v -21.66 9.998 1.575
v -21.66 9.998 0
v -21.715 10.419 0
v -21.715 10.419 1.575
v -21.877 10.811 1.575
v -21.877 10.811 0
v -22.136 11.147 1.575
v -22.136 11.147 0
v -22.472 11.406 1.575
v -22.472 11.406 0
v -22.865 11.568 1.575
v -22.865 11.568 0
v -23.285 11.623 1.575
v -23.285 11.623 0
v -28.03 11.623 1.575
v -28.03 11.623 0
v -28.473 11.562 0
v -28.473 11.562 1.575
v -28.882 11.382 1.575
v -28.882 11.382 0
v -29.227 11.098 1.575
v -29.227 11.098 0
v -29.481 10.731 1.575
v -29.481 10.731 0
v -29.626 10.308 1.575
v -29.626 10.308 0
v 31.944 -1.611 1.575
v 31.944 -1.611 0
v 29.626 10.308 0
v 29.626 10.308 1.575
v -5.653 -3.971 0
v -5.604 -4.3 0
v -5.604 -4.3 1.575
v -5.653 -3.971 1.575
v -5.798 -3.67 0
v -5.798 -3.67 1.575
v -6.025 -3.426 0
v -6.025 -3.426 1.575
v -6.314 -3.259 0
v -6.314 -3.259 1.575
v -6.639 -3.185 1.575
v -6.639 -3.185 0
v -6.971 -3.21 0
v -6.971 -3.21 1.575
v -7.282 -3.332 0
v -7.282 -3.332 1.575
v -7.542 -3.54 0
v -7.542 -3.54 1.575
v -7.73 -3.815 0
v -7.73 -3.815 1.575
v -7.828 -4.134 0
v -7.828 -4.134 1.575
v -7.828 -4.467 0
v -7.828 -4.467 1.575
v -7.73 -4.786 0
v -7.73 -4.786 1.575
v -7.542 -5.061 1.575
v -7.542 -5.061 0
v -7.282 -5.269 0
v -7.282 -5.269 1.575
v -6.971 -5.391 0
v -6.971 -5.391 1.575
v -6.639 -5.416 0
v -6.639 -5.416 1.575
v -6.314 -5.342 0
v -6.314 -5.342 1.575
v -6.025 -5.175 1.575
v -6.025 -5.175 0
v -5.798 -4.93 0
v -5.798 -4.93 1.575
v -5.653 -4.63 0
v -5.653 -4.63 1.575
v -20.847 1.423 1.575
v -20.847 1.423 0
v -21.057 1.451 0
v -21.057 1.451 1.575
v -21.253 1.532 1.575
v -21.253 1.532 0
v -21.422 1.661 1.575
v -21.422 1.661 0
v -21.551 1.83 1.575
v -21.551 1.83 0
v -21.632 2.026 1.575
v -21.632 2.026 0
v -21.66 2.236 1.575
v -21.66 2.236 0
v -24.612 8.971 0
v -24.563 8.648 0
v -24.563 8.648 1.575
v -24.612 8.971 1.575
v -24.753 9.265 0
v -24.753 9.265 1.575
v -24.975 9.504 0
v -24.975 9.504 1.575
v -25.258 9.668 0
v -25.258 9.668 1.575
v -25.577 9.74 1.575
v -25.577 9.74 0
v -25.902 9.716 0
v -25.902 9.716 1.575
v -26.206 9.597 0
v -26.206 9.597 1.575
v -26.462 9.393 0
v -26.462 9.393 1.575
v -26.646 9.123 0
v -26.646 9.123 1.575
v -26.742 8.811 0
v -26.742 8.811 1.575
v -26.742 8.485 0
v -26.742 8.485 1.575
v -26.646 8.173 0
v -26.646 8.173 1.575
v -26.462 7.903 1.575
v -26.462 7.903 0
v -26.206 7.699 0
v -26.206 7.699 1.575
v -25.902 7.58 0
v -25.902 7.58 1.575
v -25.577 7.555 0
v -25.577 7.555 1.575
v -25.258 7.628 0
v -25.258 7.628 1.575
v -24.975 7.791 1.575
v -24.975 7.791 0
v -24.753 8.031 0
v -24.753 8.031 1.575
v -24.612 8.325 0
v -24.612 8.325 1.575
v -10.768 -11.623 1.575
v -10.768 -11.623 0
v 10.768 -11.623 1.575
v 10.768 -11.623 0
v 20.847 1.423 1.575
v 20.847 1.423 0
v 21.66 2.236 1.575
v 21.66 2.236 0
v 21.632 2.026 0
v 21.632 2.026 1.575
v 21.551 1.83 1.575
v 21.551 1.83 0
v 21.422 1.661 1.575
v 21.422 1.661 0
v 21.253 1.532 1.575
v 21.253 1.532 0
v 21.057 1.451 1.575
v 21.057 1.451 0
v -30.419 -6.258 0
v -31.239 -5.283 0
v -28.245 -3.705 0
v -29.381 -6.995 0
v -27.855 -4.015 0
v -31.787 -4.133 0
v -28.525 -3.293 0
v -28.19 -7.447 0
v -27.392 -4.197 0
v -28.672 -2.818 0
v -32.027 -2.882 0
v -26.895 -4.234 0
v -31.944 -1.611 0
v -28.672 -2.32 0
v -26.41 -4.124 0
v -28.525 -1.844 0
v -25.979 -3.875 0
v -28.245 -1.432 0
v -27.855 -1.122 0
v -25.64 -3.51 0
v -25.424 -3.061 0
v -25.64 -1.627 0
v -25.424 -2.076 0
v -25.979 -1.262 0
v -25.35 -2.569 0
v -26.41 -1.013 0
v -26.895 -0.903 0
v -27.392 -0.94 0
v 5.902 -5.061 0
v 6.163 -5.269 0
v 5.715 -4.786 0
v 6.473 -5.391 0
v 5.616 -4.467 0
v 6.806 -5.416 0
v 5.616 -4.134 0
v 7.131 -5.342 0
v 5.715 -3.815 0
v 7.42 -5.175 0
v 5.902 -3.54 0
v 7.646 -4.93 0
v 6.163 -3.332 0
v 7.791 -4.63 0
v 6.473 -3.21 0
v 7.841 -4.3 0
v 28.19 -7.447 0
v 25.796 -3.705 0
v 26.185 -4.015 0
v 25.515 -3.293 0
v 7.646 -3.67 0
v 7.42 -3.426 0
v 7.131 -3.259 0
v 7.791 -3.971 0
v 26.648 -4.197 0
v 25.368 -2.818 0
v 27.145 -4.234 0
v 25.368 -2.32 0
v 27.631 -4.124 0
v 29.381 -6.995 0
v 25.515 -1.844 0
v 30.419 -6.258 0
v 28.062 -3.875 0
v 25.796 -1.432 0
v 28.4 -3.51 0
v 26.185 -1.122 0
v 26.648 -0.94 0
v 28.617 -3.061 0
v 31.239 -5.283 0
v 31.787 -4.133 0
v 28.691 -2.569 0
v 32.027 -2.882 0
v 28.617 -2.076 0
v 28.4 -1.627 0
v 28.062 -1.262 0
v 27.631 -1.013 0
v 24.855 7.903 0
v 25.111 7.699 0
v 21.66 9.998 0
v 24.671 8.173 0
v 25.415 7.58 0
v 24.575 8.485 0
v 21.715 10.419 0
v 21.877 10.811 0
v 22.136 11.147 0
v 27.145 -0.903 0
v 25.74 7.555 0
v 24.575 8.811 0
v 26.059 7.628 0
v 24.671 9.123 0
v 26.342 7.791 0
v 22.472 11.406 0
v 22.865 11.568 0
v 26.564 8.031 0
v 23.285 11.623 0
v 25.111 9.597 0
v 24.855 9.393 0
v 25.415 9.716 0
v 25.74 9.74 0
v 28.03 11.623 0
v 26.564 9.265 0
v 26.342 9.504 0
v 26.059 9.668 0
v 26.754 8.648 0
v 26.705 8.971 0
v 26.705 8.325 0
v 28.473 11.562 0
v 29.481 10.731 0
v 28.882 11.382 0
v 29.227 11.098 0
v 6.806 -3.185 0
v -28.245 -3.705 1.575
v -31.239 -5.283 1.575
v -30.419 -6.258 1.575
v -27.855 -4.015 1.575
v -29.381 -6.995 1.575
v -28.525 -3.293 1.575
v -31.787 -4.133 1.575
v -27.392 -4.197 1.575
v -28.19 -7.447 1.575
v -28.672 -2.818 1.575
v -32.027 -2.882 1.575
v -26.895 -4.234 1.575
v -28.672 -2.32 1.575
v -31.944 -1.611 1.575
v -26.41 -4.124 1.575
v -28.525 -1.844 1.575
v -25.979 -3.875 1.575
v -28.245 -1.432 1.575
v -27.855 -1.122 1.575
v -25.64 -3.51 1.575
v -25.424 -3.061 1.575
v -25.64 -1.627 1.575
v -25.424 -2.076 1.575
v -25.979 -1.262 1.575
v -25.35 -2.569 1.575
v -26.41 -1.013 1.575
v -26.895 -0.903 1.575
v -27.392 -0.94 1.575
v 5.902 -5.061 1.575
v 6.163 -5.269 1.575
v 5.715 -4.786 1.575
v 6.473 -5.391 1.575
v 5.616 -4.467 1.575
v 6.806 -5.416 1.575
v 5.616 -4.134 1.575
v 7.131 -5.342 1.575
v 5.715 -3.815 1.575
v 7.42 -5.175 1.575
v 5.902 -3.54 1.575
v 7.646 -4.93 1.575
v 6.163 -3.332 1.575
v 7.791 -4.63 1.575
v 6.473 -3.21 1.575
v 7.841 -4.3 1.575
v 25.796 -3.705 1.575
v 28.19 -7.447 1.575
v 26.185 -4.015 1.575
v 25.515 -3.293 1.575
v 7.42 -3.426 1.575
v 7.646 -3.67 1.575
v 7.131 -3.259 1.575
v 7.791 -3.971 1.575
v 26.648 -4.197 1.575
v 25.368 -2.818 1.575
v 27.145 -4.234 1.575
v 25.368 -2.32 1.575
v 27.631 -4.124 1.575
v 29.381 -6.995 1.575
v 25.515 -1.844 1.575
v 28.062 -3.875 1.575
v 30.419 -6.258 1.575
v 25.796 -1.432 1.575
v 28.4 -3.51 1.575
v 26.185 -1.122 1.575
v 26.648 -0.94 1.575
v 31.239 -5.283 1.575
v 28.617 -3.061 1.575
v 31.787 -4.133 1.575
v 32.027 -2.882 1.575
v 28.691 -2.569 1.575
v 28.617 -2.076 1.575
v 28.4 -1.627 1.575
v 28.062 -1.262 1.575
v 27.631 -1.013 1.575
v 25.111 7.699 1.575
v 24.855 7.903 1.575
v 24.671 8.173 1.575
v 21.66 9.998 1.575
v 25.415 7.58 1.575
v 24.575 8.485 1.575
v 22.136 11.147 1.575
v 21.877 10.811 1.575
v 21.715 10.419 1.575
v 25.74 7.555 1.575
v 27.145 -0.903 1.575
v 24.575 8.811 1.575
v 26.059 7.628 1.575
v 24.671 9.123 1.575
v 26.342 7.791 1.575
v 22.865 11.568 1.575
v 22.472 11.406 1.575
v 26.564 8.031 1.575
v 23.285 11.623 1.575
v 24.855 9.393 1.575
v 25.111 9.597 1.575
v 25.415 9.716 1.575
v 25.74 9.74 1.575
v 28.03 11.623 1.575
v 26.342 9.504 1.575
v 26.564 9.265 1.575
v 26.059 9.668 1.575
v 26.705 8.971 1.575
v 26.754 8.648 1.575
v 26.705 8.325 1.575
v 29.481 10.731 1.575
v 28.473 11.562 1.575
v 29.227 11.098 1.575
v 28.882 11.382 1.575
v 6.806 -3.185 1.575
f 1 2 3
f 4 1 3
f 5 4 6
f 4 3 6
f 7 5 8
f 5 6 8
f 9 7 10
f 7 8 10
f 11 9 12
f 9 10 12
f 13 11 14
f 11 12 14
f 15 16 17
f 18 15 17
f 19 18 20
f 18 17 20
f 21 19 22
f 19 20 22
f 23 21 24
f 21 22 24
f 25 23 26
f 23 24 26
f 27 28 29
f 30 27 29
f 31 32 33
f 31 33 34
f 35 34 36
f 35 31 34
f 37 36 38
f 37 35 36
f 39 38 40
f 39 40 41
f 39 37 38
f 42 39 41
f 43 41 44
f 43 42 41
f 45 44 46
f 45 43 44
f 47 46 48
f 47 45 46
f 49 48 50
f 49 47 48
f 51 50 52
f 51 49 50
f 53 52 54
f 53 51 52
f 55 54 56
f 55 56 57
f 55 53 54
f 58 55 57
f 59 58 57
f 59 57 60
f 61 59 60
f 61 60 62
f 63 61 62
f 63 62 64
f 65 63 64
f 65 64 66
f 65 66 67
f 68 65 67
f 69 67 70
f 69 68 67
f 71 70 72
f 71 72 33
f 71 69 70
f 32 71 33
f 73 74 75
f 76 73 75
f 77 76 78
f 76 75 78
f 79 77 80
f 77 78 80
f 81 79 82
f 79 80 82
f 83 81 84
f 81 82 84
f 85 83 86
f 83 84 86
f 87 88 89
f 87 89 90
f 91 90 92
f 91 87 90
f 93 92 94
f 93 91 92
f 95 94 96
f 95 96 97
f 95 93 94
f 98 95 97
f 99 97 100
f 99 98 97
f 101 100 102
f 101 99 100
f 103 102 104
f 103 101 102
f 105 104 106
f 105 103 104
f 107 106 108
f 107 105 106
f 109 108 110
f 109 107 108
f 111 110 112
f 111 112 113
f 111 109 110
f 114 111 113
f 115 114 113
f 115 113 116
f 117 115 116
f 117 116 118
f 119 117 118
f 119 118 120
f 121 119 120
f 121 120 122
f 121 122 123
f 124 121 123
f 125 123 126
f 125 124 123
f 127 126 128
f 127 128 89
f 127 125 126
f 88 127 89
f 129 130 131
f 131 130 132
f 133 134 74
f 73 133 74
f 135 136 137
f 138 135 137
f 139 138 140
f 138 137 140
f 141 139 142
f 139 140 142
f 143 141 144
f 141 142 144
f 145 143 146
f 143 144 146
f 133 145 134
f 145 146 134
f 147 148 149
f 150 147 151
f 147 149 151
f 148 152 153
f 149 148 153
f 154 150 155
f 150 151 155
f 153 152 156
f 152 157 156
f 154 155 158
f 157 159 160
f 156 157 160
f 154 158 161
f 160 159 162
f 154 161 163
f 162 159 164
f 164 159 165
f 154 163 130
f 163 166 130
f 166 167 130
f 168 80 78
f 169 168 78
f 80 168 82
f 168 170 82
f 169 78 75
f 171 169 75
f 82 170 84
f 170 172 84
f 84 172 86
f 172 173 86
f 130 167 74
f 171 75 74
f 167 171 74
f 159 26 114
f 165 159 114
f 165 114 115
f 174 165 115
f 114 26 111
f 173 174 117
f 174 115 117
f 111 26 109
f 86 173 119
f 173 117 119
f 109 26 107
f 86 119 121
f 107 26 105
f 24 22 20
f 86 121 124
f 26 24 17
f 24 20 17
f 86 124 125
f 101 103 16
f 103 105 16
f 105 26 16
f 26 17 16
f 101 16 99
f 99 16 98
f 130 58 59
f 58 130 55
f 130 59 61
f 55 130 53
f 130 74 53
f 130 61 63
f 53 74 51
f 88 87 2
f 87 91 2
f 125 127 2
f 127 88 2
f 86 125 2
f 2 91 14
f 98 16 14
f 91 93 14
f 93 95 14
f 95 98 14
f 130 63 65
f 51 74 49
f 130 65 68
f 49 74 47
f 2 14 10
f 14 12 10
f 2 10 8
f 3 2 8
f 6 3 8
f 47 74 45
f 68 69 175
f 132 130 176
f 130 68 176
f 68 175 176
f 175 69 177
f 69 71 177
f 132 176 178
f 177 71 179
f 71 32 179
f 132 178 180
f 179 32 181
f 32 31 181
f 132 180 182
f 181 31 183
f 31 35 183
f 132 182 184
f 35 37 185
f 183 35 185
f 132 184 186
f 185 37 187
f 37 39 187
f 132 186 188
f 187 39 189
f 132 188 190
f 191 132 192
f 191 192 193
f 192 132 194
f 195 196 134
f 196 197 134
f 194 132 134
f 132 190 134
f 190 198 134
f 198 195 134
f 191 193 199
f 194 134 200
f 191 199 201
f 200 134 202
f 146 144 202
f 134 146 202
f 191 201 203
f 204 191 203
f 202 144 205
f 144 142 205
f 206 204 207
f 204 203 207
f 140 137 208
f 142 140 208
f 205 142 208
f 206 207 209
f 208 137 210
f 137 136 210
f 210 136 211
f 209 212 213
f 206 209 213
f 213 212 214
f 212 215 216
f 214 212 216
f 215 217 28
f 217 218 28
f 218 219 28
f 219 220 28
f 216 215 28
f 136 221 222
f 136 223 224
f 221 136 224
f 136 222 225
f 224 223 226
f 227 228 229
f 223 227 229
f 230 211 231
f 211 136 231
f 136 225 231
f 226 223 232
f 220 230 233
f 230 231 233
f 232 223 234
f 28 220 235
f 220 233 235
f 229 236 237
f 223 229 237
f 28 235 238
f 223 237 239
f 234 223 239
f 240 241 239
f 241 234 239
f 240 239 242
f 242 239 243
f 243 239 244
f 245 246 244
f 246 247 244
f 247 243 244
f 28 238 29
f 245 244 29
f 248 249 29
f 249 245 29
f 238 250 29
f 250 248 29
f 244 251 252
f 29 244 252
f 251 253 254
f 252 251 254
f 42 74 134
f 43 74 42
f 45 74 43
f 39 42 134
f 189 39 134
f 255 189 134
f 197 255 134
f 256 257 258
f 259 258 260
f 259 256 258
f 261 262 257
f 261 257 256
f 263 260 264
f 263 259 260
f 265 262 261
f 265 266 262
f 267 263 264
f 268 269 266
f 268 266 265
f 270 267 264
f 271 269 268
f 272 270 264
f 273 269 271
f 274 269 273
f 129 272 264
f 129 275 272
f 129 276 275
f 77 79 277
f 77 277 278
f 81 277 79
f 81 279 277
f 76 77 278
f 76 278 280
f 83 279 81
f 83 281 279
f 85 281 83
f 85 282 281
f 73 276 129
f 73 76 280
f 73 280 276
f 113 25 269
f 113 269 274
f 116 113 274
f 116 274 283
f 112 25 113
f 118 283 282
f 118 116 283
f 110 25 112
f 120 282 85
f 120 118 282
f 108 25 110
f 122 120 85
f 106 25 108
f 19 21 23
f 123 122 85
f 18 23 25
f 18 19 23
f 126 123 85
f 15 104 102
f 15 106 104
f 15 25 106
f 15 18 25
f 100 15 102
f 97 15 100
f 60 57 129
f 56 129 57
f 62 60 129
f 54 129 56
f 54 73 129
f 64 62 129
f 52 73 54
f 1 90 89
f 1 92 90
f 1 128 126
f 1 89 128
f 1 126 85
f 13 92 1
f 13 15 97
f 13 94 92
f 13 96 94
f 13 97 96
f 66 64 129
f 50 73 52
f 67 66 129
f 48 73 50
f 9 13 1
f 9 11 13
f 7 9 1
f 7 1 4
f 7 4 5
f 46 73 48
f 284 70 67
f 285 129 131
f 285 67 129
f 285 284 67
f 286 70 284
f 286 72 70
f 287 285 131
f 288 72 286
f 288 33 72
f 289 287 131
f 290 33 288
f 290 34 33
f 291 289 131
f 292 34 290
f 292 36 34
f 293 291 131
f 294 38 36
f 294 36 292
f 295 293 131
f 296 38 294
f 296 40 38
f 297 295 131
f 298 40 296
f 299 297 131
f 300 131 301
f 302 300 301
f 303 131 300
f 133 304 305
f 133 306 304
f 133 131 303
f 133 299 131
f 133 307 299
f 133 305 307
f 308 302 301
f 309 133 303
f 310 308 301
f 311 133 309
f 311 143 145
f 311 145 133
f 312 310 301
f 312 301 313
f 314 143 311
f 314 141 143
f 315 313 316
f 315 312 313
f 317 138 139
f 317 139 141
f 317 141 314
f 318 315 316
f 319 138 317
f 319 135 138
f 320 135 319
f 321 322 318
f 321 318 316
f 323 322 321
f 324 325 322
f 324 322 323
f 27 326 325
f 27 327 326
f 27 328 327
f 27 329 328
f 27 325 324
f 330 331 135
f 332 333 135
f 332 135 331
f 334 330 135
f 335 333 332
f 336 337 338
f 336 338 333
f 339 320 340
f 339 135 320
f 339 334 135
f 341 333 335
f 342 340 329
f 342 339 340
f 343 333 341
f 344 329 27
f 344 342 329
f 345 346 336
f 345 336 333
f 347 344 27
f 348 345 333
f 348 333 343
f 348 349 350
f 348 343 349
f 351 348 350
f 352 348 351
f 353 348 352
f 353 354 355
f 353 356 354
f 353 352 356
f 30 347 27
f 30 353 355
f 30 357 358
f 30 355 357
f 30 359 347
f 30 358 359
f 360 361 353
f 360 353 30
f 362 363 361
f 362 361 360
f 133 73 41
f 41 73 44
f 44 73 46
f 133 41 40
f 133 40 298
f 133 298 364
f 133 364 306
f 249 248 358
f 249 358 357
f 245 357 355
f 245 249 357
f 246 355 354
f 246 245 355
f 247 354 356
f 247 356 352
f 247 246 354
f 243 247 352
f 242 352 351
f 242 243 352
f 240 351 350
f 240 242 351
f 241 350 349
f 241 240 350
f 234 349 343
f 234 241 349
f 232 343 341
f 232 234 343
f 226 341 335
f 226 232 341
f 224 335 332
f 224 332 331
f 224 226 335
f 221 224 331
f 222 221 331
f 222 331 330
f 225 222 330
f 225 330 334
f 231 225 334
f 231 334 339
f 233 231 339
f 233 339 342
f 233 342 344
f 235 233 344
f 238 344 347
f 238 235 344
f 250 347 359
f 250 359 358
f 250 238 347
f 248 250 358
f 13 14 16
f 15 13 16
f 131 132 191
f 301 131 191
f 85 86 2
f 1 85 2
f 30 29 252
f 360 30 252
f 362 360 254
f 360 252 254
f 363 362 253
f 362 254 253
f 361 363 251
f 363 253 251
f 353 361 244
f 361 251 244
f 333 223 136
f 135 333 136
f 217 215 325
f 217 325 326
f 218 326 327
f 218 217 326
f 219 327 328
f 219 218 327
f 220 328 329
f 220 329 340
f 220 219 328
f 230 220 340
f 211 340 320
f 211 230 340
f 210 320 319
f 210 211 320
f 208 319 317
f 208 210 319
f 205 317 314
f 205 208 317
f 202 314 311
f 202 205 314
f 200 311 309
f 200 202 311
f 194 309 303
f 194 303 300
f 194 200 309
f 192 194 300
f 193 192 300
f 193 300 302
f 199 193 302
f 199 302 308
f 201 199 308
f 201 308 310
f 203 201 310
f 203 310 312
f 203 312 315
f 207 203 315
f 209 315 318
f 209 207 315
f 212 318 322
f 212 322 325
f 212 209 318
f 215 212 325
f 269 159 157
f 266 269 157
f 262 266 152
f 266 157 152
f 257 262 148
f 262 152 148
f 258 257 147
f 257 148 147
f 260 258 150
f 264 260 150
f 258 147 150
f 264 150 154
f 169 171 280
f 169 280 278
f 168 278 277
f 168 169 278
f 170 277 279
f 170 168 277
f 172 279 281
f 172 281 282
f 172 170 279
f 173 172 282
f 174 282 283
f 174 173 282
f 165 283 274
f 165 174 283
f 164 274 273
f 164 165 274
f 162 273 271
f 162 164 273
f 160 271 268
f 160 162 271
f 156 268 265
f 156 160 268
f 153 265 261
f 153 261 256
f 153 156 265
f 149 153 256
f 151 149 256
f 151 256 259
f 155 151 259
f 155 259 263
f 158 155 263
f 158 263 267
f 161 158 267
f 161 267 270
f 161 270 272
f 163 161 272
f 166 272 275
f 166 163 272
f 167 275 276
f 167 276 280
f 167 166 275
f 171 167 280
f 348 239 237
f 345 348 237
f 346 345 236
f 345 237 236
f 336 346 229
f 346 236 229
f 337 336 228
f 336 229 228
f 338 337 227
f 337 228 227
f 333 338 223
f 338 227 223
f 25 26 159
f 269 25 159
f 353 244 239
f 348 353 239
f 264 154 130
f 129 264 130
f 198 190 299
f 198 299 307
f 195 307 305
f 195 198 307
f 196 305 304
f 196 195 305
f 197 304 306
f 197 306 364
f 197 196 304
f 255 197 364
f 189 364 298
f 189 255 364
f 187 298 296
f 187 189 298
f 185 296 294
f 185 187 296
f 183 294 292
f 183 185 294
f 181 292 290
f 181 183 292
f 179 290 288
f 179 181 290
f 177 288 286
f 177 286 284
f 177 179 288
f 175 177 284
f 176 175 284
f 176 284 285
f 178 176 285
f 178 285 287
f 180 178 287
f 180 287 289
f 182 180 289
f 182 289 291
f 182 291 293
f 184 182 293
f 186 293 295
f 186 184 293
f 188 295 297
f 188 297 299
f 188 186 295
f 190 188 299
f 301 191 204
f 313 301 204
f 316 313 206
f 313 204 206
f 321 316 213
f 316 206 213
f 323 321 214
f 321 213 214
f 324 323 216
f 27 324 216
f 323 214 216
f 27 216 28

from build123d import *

# Parameters (mm, degrees)
F0_R     = 1.6706088
F0_R_2   = 1.1185144
F0_R_3   = 1.0956036
F1_DEPTH = 1.5748


# Not quite as in the source:
# - ends of sketch curves that miss each other by under 0.0002 mm in the source are joined


with BuildPart() as f1:
    # F0 (on Top) → F1 (new body)
    with BuildSketch(Plane.XY):
        with BuildLine():
            Line((-23.2852722, 11.6233956), (-25.6565654, 11.6233956))
            Line((-25.6565654, 11.6233956), (-28.0302208, 11.6233956))
            ThreePointArc((-28.0302208, 11.6233956), (-29.0641368167, 11.2522249645), (-29.6259080683, 10.3082106474))
            Line((-29.6259080683, 10.3082106474), (-31.944437, -1.6106394))
            ThreePointArc((-31.944437, -1.6106394), (-31.2390678474, -5.2827981728), (-28.1896575043, -7.446928172))
            Line((-28.1896575043, -7.446928172), (-10.768076, -11.623421))
            Line((-10.768076, -11.623421), (0, -11.623421))
            Line((0, -11.623421), (10.768076, -11.623421))
            Line((10.768076, -11.623421), (28.1896566, -7.4469244))
            ThreePointArc((28.1896566, -7.4469244), (31.2390678474, -5.2827981728), (31.9444603849, -1.610634851))
            Line((31.9444603849, -1.610634851), (29.6258996, 10.308209))
            ThreePointArc((29.6258996, 10.308209), (29.0641368167, 11.2522249645), (28.0302208, 11.6233956))
            Line((28.0302208, 11.6233956), (25.6565654, 11.6233956))
            Line((25.6565654, 11.6233956), (23.2852722, 11.6233956))
            ThreePointArc((23.2852722, 11.6233956), (22.1357994165, 11.1472683835), (21.6596722, 9.9977956))
            Line((21.6596722, 9.9977956), (21.6596722, 2.2361652))
            ThreePointArc((21.6596722, 2.2361652), (21.4216085917, 1.6614288083), (20.8468722, 1.4233652))
            Line((20.8468722, 1.4233652), (0, 1.4233652))
            Line((0, 1.4233652), (-20.8468722, 1.4233652))
            ThreePointArc((-20.8468722, 1.4233652), (-21.4216085917, 1.6614288083), (-21.6596722, 2.2361652))
            Line((-21.6596722, 2.2361652), (-21.6596722, 9.9977956))
            ThreePointArc((-21.6596722, 9.9977956), (-22.1357994165, 11.1472683835), (-23.2852722, 11.6233956))
        make_face()
        with Locations((-27.0201644, -2.5685496)):
            Circle(F0_R, mode=Mode.SUBTRACT)
        with Locations((-6.7222878, -4.3003216)):
            Circle(F0_R_2, mode=Mode.SUBTRACT)
        with Locations((6.7222878, -4.3003216)):
            Circle(F0_R_2, mode=Mode.SUBTRACT)
        with Locations((27.0201644, -2.5685496)):
            Circle(F0_R, mode=Mode.SUBTRACT)
        with Locations((-25.658445, 8.6478872)):
            Circle(F0_R_3, mode=Mode.SUBTRACT)
        with Locations((25.658445, 8.6478872)):
            Circle(F0_R_3, mode=Mode.SUBTRACT)
    extrude(amount=F1_DEPTH)


solid = f1.part
